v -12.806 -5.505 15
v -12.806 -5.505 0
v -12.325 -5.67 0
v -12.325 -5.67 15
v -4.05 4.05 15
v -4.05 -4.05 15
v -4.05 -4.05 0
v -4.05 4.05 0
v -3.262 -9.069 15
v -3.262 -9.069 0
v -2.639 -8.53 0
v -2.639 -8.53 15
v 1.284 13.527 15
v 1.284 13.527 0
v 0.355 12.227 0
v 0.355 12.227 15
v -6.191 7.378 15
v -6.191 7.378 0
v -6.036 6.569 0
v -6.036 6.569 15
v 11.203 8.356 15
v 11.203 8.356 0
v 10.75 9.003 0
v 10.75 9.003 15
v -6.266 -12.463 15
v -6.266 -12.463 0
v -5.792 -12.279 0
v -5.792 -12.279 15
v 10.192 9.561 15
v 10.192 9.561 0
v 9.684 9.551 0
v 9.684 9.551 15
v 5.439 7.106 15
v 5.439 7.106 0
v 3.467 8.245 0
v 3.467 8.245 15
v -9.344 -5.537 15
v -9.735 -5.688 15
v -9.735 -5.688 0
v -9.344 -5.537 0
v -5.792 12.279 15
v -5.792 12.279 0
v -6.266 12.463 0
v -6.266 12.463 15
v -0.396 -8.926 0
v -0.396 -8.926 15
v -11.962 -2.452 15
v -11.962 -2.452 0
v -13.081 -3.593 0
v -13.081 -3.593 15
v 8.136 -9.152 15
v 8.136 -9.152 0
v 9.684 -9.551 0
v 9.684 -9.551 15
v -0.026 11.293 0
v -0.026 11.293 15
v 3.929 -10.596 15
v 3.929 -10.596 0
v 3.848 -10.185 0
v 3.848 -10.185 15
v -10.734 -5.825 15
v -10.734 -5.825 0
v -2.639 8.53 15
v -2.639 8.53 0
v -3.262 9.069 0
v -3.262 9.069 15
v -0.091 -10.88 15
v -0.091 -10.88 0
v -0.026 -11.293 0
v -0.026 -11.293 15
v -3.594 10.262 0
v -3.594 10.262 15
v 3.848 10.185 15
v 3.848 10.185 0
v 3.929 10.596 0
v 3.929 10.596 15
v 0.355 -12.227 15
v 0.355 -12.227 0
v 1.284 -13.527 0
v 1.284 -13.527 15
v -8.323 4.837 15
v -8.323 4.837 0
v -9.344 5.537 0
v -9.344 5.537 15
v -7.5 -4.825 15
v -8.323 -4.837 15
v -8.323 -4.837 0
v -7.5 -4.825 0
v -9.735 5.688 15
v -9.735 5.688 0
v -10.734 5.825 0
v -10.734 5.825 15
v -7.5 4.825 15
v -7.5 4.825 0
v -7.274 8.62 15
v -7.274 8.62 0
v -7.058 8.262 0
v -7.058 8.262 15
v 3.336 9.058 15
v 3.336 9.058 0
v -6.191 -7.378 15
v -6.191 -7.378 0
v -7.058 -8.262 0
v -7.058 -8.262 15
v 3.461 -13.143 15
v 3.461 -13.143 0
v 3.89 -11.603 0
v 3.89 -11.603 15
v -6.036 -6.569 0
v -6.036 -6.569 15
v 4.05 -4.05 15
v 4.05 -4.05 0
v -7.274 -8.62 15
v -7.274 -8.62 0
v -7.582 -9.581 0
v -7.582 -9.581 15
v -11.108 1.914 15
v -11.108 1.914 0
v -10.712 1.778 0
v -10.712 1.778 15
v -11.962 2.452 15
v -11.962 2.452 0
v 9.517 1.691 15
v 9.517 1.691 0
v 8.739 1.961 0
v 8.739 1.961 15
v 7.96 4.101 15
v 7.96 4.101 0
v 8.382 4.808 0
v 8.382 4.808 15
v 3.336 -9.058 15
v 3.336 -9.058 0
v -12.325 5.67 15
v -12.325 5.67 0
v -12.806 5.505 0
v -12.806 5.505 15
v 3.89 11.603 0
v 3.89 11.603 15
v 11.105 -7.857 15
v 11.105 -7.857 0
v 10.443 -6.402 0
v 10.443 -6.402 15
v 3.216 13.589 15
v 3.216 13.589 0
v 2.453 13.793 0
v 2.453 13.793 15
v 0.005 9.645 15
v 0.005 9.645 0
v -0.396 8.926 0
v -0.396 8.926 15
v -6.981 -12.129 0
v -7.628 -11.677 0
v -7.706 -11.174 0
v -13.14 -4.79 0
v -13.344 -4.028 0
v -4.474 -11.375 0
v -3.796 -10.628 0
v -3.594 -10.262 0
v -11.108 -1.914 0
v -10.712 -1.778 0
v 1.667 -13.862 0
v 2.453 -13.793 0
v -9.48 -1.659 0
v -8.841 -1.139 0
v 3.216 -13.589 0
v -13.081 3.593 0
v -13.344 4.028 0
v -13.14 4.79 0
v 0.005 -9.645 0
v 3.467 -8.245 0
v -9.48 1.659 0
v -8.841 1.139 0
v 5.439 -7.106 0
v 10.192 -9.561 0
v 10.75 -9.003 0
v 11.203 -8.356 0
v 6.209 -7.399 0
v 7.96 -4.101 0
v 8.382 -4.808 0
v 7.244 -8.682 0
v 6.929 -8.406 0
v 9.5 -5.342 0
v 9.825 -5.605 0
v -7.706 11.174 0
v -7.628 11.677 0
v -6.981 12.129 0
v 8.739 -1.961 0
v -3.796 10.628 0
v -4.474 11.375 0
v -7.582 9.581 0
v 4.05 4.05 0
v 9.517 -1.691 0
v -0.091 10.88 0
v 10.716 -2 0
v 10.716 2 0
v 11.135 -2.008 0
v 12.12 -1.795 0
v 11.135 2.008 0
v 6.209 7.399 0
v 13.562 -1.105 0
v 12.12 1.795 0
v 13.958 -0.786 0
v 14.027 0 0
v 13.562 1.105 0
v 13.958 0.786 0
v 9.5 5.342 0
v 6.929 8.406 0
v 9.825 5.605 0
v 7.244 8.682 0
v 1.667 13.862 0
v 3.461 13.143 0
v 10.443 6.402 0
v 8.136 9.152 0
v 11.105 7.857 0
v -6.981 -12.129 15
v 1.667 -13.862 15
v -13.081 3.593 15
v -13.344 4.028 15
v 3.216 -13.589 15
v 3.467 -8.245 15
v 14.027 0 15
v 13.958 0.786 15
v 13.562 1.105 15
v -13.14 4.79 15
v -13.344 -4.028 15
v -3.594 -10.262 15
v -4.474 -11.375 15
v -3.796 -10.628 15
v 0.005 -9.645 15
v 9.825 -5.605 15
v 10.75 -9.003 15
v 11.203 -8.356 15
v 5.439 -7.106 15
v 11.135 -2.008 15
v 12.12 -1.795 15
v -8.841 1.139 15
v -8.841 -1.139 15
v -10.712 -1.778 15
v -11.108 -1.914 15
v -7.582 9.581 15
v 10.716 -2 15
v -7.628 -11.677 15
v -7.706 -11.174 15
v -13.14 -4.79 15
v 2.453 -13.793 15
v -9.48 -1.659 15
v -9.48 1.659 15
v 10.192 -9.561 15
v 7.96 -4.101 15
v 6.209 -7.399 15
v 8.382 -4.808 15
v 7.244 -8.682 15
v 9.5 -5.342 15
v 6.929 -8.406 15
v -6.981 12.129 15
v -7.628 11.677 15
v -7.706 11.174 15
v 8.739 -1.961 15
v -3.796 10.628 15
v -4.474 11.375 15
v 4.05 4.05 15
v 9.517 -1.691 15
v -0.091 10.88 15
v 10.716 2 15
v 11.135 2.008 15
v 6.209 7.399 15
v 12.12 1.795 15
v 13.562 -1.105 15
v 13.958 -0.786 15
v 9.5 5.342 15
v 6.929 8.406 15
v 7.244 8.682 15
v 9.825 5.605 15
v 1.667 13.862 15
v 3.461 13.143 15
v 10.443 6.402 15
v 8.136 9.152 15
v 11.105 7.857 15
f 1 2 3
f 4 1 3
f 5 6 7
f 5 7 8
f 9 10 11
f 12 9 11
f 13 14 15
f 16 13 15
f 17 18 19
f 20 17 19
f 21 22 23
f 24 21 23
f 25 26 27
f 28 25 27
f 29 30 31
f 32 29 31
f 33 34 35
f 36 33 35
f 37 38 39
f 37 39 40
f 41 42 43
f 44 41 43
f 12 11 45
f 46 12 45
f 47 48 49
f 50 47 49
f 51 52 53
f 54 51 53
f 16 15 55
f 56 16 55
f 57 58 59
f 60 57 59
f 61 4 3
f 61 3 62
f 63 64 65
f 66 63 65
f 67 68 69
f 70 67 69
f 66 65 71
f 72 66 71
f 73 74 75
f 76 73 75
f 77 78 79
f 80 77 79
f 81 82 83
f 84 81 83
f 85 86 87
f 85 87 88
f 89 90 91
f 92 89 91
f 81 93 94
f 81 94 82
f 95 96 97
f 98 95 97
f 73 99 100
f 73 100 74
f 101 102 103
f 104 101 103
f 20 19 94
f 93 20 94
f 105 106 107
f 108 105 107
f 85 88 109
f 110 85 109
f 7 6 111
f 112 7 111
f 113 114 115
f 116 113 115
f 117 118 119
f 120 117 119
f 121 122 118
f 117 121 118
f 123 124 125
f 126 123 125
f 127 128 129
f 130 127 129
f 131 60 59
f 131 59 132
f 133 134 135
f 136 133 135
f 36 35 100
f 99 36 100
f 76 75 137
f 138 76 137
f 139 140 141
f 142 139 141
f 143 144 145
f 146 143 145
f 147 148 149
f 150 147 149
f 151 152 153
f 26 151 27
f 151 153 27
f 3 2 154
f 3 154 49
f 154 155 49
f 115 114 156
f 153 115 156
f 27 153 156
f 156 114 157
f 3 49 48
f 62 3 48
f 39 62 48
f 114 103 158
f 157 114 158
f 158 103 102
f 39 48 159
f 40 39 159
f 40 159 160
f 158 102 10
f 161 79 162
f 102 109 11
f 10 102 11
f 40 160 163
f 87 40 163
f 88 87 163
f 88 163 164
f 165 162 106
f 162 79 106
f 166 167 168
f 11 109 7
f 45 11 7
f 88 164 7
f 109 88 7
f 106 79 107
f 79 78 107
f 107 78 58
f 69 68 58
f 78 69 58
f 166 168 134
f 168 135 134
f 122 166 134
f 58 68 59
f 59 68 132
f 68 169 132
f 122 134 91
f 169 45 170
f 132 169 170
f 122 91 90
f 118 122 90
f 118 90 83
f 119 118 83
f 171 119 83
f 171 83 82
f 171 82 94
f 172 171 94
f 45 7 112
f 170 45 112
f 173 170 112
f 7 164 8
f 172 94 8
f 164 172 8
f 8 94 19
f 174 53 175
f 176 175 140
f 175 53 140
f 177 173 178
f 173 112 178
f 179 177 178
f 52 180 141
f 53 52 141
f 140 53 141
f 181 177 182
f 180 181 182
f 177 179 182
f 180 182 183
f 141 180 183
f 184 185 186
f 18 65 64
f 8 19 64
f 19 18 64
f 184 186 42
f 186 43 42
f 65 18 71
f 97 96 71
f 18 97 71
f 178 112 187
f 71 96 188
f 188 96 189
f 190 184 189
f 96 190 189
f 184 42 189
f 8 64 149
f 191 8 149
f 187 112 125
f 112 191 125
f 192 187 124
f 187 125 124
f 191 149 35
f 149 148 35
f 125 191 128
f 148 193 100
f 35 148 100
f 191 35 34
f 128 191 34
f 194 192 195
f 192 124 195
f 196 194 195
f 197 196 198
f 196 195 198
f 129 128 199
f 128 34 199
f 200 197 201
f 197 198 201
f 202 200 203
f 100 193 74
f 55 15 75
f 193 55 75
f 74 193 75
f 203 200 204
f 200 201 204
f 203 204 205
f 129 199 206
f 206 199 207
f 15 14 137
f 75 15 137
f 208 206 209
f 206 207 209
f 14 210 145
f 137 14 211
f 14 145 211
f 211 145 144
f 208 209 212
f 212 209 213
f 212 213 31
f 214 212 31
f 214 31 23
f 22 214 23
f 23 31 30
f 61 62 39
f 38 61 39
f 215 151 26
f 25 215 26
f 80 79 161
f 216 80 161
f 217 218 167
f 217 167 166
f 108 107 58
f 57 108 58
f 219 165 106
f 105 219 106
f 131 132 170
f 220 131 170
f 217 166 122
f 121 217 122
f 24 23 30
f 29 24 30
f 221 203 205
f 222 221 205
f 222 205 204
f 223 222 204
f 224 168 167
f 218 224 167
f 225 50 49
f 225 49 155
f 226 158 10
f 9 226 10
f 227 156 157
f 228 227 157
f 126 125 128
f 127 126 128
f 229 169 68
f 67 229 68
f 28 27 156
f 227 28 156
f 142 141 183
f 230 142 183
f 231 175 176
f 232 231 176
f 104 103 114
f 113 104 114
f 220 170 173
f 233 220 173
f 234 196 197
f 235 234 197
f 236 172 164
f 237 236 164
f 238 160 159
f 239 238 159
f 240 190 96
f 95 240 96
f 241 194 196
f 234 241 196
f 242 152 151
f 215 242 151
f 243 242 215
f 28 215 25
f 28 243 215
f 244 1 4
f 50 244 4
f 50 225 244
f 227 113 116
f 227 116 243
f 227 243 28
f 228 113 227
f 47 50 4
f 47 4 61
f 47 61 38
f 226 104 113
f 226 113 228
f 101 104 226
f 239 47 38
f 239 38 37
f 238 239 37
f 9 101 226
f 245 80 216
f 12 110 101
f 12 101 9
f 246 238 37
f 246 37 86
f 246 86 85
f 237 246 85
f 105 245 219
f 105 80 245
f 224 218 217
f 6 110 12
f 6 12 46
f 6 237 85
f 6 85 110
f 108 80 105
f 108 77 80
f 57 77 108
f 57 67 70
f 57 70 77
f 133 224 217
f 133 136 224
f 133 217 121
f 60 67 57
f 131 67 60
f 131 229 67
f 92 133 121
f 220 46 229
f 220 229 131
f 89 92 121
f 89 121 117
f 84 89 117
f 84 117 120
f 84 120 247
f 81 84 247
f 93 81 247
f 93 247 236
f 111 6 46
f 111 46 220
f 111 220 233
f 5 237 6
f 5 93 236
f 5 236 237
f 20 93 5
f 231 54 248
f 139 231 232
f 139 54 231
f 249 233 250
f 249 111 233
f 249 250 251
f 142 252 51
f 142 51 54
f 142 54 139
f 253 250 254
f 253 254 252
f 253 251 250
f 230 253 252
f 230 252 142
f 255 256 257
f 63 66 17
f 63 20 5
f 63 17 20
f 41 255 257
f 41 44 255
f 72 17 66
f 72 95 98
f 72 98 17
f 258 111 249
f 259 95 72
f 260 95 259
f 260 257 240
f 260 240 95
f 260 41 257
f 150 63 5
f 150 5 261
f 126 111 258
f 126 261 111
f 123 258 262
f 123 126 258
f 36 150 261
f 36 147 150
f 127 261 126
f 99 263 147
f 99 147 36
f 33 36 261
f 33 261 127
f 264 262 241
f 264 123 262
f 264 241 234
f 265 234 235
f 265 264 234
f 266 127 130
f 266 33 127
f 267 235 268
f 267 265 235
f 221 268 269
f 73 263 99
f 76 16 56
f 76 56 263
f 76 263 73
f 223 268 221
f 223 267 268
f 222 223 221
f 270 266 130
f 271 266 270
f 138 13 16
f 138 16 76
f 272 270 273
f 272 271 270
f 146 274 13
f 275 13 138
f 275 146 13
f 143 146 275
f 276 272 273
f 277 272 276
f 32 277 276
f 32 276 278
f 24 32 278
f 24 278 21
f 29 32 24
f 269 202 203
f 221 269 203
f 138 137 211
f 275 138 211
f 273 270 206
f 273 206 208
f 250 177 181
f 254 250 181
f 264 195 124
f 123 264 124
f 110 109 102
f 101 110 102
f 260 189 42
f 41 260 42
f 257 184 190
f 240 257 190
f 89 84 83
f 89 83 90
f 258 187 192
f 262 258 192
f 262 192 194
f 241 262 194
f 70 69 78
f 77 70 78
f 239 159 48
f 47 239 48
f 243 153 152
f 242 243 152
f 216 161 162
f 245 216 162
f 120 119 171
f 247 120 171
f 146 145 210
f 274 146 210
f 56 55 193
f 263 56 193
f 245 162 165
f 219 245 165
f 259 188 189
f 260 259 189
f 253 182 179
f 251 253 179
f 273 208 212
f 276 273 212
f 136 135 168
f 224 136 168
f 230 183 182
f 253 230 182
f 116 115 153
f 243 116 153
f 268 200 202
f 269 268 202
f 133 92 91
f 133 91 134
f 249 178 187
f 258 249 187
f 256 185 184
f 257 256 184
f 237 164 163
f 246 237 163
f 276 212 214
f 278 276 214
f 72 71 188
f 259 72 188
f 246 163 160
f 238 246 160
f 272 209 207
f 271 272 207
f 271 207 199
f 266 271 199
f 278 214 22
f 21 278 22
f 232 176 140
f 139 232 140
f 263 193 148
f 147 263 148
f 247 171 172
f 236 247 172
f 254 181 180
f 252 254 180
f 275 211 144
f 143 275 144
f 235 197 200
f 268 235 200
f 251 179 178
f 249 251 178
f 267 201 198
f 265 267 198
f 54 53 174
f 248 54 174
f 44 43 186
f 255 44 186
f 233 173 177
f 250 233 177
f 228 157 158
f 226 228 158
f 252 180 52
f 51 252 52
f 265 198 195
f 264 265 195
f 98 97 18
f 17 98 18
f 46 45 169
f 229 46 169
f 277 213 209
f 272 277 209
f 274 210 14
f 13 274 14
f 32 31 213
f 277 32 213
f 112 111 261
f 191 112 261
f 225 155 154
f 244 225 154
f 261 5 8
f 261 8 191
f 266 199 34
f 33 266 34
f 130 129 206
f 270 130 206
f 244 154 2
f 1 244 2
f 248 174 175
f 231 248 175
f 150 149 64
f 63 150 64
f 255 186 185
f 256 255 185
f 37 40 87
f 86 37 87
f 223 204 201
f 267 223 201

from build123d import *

# Parameters (mm, degrees)
F1_DEPTH = 15
F2_W     = 8.1
F2_H     = 8.1
F3_DEPTH = 15.001


with BuildPart() as f1:
    # F0 (on Top) → F1 (new body)
    with BuildSketch(Plane.XY):
        Polygon((9.68382, -9.550715), (10.192379, -9.560642), (10.750372, -9.002649), (11.202993, -8.356238), (11.104907, -7.857129), (10.443332, -6.402182), (9.825447, -5.605176), (9.499566, -5.342395), (8.382424, -4.808387), (7.960216, -4.101107), (8.739034, -1.961321), (9.517096, -1.690903), (10.716129, -1.999914), (11.134681, -2.008084), (12.120314, -1.794712), (13.562332, -1.105409), (13.958292, -0.786118), (14.027068, 0), (13.958292, 0.786118), (13.562332, 1.105409), (12.120314, 1.794712), (11.134681, 2.008084), (10.716129, 1.999914), (9.517096, 1.690903), (8.739034, 1.961321), (7.960216, 4.101107), (8.382424, 4.808387), (9.499566, 5.342395), (9.825447, 5.605176), (10.443332, 6.402182), (11.104907, 7.857129), (11.202993, 8.356238), (10.750372, 9.002649), (10.192379, 9.560642), (9.68382, 9.550715), (8.136095, 9.15184), (7.243903, 8.68174), (6.928526, 8.406442), (6.208641, 7.399001), (5.43879, 7.106025), (3.466753, 8.244581), (3.335552, 9.05778), (3.848079, 10.184939), (3.928805, 10.595713), (3.889828, 11.603424), (3.461401, 13.14323), (3.215719, 13.588618), (2.453486, 13.792858), (1.667367, 13.861634), (1.28417, 13.527134), (0.354935, 12.22672), (-0.026349, 11.293113), (-0.090983, 10.879501), (0.005123, 9.645024), (-0.396296, 8.925741), (-2.638814, 8.530325), (-3.262033, 9.068937), (-3.593939, 10.261836), (-3.796139, 10.628398), (-4.473741, 11.375294), (-5.791704, 12.279467), (-6.266198, 12.462733), (-6.981384, 12.129236), (-7.627795, 11.676614), (-7.706329, 11.174057), (-7.582274, 9.580582), (-7.274243, 8.620313), (-7.057892, 8.261922), (-6.190763, 7.378034), (-6.035921, 6.569004), (-7.499621, 4.824634), (-8.323248, 4.836637), (-9.344283, 5.537106), (-9.734799, 5.687937), (-10.733969, 5.824539), (-12.324777, 5.670005), (-12.806062, 5.505396), (-13.139559, 4.790209), (-13.343798, 4.027977), (-13.080922, 3.592515), (-11.961624, 2.451584), (-11.10841, 1.913973), (-10.712305, 1.778497), (-9.479894, 1.658779), (-8.841244, 1.138556), (-8.841244, -1.138556), (-9.479894, -1.658779), (-10.712305, -1.778497), (-11.10841, -1.913973), (-11.961624, -2.451584), (-13.080922, -3.592515), (-13.343798, -4.027977), (-13.139559, -4.790209), (-12.806062, -5.505396), (-12.324777, -5.670005), (-10.733969, -5.824539), (-9.734799, -5.687937), (-9.344283, -5.537106), (-8.323248, -4.836637), (-7.499621, -4.824634), (-6.035921, -6.569004), (-6.190763, -7.378034), (-7.057892, -8.261922), (-7.274243, -8.620313), (-7.582274, -9.580582), (-7.706329, -11.174057), (-7.627795, -11.676614), (-6.981384, -12.129236), (-6.266198, -12.462733), (-5.791704, -12.279467), (-4.473741, -11.375294), (-3.796139, -10.628398), (-3.593939, -10.261836), (-3.262033, -9.068937), (-2.638814, -8.530325), (-0.396296, -8.925741), (0.005123, -9.645024), (-0.090983, -10.879501), (-0.026349, -11.293113), (0.354935, -12.22672), (1.28417, -13.527134), (1.667367, -13.861634), (2.453486, -13.792858), (3.215719, -13.588618), (3.461401, -13.14323), (3.889828, -11.603424), (3.928805, -10.595713), (3.848079, -10.184939), (3.335552, -9.05778), (3.466753, -8.244581), (5.43879, -7.106025), (6.208641, -7.399001), (6.928526, -8.406442), (7.243903, -8.68174), (8.136095, -9.15184), align=None)
    extrude(amount=F1_DEPTH)

    # F2 (on face) → F3 (cut, through all)
    with BuildSketch(Plane.XY.offset(15)):
        Rectangle(F2_W, F2_H)
    extrude(amount=-F3_DEPTH, mode=Mode.SUBTRACT)


solid = f1.part
